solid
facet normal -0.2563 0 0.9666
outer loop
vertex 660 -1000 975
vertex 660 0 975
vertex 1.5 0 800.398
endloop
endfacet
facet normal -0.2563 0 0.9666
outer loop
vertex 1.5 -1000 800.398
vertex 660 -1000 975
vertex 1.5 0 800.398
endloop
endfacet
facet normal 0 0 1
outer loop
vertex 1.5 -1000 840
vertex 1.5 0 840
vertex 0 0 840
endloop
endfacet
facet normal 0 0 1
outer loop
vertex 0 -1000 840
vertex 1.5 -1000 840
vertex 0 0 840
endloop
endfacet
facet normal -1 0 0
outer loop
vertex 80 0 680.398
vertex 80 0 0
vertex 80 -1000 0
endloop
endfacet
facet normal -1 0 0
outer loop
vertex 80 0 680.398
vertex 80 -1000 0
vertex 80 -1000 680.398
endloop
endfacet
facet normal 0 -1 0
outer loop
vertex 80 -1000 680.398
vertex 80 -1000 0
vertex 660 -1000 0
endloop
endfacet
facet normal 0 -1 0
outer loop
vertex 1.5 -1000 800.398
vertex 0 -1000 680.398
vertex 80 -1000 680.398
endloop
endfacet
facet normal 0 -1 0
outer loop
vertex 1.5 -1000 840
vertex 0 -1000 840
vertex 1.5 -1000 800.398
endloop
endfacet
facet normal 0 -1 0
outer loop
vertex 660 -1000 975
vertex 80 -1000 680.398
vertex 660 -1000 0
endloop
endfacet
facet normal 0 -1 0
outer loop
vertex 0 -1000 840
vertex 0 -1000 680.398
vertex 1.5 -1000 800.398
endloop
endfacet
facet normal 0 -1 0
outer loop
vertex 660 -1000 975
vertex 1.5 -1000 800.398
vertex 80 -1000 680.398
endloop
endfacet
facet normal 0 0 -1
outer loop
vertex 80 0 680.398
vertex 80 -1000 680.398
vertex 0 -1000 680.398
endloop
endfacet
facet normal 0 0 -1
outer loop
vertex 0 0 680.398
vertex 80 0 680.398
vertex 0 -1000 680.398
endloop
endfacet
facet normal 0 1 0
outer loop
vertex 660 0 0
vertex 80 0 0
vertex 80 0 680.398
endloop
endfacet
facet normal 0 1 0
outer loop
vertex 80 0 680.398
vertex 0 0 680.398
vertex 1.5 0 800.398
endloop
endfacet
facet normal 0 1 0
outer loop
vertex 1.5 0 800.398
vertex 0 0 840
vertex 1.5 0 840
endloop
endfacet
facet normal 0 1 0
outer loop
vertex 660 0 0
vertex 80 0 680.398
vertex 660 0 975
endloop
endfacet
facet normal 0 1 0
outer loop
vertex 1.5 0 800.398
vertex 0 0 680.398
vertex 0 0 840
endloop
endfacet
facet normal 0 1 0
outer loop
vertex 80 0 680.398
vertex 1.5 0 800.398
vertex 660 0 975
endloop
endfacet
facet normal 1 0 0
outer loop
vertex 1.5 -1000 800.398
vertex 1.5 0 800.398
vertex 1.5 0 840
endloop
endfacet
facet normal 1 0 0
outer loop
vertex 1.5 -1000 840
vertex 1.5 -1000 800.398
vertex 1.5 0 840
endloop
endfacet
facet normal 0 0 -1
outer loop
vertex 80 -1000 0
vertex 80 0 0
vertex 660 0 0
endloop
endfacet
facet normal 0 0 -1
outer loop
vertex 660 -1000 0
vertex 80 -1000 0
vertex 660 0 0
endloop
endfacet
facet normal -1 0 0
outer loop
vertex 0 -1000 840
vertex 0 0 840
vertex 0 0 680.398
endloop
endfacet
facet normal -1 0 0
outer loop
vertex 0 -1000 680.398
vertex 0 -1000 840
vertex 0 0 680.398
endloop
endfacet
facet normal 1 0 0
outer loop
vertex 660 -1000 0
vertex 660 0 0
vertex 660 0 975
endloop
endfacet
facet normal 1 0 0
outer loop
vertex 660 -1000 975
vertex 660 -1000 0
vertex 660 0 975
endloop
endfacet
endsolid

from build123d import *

# Parameters (mm, degrees)
F1_DEPTH = 1000
F3_DEPTH = 1000
F4_W     = 80
F4_H     = 680.397727
F5_DEPTH = 1000


with BuildPart() as f1:
    # F0 (on Front) → F1 (new body)
    with BuildSketch(Plane.XZ):
        Polygon((0, 800), (0, 0), (660, 0), (660, 975), align=None)
    extrude(amount=F1_DEPTH)

    # F2 (on Front) → F3 (join, through all)
    with BuildSketch(Plane.XZ):
        Polygon((0, 840), (0, 800), (1.5, 800.397727), (1.5, 840), align=None)
    extrude(amount=F3_DEPTH)

    # F4 (on face) → F5 (cut, through all)
    with BuildSketch(Plane(origin=(0, 0, 0), x_dir=(-1, 0, 0), z_dir=(0, 1, 0))):
        with Locations((-40, 340.198863)):
            Rectangle(F4_W, F4_H)
    extrude(amount=-F5_DEPTH, mode=Mode.SUBTRACT)


solid = f1.part
